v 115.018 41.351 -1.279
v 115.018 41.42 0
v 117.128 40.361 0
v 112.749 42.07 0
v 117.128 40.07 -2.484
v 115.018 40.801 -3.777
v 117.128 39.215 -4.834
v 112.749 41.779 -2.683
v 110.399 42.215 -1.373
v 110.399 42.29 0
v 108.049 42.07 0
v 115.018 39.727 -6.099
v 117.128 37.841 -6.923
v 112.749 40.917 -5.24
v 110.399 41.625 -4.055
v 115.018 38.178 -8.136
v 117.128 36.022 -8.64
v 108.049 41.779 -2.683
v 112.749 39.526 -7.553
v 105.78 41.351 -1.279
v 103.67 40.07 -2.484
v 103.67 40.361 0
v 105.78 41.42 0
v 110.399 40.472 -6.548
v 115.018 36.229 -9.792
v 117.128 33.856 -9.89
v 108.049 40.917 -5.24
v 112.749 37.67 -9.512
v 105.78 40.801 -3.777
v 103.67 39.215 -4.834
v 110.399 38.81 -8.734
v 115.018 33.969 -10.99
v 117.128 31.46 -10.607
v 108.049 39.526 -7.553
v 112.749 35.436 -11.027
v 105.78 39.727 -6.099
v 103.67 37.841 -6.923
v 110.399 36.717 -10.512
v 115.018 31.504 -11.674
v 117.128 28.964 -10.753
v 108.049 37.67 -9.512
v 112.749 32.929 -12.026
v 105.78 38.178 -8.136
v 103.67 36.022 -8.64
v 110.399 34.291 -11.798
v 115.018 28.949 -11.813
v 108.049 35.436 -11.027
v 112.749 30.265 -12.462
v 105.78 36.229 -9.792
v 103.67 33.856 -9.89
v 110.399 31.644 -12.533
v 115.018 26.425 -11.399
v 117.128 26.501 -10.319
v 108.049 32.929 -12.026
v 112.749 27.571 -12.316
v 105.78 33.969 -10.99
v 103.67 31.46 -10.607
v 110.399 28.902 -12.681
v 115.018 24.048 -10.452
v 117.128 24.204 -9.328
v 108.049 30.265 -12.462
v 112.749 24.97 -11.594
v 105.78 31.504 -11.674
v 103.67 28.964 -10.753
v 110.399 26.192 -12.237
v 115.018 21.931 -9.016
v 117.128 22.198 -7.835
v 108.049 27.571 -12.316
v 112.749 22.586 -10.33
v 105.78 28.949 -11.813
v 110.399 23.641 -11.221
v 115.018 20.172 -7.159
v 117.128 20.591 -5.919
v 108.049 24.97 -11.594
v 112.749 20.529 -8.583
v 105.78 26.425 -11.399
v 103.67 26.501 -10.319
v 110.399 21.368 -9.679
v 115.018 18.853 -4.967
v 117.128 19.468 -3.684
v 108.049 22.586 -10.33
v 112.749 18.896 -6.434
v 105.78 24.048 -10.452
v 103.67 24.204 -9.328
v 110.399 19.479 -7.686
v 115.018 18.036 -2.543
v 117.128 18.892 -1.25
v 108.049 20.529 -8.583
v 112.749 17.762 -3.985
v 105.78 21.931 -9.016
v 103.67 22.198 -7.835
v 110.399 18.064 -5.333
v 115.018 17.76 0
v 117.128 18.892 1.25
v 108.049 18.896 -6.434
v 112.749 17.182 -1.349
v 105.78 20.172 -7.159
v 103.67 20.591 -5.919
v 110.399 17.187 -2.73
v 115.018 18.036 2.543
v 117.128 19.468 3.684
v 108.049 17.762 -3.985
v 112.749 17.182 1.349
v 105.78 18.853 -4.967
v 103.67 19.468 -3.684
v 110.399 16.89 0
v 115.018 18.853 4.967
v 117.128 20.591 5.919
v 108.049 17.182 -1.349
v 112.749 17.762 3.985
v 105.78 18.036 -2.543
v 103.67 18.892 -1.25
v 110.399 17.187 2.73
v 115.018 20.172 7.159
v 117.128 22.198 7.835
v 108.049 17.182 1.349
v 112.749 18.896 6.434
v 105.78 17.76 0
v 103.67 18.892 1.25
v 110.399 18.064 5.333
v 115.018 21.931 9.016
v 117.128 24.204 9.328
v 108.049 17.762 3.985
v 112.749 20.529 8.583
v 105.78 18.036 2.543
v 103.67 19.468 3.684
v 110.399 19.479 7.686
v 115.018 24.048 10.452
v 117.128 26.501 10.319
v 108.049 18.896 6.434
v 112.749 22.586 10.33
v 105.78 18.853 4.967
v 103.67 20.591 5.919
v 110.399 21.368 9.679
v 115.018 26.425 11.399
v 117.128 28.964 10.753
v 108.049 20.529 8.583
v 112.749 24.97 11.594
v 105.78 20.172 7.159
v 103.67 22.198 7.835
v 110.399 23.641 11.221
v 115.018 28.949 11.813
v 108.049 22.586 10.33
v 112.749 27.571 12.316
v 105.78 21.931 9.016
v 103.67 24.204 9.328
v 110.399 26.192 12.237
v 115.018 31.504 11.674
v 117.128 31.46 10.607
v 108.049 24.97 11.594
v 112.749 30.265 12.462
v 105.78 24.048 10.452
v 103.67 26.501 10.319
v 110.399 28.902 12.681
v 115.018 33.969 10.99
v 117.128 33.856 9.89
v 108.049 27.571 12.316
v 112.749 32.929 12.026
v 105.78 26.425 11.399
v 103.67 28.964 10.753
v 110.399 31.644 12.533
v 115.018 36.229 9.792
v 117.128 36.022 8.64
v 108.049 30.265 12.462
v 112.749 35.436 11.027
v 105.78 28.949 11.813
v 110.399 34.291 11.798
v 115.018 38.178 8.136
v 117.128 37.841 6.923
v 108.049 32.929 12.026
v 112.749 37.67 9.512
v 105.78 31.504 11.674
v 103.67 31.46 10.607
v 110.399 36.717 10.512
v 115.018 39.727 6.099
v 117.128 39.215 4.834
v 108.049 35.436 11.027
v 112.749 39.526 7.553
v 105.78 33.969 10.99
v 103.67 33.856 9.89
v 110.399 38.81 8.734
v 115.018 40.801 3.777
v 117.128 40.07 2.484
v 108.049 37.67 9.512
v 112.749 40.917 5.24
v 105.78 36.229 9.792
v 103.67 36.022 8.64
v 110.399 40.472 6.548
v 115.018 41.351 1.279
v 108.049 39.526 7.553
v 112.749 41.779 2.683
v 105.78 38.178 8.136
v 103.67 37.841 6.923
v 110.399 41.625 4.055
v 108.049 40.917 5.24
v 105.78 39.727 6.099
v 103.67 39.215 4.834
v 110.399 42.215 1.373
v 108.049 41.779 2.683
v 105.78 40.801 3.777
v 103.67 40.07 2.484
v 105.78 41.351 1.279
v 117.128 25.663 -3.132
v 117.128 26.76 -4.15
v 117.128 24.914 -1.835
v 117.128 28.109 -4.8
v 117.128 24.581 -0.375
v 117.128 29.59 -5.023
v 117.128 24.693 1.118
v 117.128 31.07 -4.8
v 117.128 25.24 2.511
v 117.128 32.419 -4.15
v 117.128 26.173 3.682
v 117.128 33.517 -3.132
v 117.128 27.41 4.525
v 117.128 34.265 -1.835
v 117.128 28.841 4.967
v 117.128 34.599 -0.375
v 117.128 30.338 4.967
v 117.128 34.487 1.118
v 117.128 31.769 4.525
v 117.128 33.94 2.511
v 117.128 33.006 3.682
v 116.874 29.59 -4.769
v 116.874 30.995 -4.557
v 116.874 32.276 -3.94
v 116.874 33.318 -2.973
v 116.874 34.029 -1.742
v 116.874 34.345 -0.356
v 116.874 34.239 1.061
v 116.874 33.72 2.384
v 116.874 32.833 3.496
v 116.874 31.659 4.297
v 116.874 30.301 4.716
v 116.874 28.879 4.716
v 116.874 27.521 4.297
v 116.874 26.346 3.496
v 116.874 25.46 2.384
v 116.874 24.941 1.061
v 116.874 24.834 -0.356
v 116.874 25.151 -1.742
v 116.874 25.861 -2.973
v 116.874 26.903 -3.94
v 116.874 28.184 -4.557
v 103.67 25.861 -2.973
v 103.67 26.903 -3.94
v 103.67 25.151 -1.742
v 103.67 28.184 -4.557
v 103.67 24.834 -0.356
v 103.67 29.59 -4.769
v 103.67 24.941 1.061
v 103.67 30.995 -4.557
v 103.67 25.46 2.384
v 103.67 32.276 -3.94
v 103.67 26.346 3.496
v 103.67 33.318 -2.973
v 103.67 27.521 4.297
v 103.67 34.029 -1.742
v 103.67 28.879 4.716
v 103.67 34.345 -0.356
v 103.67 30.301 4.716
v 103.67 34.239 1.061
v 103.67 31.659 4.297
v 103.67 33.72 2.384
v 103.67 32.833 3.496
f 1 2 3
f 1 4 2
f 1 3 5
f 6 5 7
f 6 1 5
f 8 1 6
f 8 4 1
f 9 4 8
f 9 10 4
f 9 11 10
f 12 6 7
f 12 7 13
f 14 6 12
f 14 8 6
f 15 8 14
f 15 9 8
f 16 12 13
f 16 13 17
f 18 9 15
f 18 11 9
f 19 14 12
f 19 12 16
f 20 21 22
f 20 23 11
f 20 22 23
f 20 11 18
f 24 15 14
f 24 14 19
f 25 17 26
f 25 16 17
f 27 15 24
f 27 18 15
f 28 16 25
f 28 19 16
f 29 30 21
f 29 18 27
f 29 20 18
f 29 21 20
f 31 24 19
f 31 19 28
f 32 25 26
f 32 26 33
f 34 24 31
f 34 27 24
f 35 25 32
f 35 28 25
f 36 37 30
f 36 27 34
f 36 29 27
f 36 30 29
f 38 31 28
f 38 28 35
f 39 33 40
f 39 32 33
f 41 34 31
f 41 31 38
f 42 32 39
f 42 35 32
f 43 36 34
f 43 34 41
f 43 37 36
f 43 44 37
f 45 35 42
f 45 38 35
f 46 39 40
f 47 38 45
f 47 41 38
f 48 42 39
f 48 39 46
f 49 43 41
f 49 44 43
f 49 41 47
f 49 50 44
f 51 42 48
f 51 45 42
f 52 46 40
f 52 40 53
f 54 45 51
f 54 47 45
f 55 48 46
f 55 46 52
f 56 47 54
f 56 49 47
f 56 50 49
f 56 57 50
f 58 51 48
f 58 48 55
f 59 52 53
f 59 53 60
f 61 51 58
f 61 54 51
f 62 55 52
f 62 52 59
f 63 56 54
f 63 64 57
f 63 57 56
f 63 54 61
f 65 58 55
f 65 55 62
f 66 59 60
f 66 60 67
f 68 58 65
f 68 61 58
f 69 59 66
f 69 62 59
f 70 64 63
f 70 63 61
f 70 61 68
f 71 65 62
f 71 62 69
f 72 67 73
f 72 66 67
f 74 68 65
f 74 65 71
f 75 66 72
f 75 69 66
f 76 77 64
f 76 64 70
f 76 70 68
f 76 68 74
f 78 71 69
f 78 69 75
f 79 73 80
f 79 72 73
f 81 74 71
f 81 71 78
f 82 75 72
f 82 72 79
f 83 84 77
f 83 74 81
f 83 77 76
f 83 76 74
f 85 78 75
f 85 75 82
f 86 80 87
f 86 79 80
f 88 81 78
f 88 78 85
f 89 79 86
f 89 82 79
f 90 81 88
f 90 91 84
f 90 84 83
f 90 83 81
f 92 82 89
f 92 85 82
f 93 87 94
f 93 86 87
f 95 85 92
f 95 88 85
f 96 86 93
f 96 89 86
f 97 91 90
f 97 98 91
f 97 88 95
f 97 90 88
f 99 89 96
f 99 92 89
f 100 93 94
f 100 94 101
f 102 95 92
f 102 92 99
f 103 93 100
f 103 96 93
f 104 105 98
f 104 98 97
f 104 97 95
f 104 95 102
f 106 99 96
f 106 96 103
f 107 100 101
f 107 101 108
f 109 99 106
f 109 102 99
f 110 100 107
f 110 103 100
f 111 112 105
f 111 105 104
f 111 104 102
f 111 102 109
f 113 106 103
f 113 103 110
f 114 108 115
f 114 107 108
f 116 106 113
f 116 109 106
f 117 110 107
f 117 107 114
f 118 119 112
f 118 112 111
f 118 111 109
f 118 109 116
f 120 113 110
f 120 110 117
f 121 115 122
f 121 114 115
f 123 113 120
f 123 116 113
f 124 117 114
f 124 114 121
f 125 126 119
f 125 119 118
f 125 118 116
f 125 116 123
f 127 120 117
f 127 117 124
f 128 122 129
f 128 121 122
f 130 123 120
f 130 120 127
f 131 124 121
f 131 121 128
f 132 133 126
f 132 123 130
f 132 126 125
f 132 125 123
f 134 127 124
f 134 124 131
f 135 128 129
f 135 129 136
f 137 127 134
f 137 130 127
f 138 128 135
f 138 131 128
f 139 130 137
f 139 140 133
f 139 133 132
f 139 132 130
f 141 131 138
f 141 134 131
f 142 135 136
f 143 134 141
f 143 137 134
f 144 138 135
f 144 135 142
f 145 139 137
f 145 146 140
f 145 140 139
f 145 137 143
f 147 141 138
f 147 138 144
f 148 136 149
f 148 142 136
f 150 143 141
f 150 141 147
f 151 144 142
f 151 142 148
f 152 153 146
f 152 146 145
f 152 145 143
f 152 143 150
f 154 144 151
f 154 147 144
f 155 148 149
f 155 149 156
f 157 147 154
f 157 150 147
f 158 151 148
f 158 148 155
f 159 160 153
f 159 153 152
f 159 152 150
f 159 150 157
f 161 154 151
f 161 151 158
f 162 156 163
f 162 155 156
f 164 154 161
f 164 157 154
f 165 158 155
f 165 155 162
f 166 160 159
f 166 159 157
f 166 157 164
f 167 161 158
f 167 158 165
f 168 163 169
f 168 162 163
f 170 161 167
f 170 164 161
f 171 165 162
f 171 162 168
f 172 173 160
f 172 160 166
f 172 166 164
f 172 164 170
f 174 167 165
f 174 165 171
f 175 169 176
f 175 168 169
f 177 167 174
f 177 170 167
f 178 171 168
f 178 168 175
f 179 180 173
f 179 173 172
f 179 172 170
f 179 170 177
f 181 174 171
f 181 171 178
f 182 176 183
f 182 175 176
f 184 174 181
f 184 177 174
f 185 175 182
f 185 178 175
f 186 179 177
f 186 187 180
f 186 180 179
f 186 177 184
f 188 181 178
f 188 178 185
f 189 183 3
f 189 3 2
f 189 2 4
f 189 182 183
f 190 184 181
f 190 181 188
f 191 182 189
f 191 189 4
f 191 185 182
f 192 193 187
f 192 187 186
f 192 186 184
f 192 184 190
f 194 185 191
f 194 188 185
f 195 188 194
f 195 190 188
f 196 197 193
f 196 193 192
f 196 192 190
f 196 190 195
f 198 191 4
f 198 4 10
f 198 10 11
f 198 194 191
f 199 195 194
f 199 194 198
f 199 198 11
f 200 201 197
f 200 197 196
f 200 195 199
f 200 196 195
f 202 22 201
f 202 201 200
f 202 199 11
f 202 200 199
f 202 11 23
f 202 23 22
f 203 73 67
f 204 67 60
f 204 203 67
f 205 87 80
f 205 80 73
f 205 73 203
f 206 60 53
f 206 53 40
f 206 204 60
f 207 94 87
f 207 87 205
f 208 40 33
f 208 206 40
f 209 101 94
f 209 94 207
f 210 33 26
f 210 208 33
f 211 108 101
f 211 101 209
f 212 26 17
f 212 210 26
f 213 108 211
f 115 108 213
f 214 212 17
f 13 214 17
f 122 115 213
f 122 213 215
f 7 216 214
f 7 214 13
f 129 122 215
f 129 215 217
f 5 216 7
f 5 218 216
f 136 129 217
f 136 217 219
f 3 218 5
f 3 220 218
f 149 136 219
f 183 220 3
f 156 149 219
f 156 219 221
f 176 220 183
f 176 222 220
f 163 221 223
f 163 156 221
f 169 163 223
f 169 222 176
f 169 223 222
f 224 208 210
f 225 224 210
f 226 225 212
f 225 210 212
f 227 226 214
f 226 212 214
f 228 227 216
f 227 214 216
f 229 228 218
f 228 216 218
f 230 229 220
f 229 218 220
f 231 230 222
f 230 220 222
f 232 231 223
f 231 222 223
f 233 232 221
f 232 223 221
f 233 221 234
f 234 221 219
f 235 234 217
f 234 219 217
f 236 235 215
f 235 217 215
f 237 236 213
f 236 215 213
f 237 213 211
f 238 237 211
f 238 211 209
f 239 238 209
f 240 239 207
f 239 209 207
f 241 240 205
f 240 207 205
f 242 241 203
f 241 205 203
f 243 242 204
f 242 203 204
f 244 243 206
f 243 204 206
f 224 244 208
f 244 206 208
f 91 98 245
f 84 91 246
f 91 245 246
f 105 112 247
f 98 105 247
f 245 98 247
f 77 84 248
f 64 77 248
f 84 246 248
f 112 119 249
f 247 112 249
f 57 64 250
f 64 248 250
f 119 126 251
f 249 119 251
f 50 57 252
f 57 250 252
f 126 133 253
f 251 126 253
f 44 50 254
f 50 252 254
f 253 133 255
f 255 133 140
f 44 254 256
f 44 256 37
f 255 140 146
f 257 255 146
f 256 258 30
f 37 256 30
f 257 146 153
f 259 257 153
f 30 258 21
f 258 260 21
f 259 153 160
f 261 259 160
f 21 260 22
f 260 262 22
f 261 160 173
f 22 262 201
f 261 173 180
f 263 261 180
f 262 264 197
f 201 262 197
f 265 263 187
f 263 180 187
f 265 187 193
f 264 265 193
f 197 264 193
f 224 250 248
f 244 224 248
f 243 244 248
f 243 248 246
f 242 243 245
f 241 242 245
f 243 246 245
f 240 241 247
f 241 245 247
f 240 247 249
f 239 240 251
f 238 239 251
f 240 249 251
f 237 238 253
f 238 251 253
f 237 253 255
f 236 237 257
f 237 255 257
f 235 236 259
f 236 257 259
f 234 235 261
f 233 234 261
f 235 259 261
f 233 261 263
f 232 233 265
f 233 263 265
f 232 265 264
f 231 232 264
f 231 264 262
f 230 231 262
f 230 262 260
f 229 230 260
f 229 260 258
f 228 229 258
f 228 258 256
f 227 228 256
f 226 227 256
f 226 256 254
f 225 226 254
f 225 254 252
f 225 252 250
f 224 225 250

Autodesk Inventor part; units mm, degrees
ref_plane "YZ Plane" through (0, 0, 0) normal (1, 0, 0) x (0, 1, 0)
ref_plane "XZ Plane" through (0, 0, 0) normal (0, 1, 0) x (-1, 0, 0)
ref_plane "XY Plane" through (0, 0, 0) normal (0, 0, 1) x (1, 0, 0)
sketch "Sketch1" plane through (0, 0, 0) normal (0, 0, 1) x (1, 0, 0)
  arc A0 (103.6702, 18.7694) -> (117.1276, 18.7694) centre (110.3989, 29.5404) ccw
  line L0 (103.6702, 40.3608) -> (103.6702, 29.5898)
  line L1 (117.1276, 40.3608) -> (117.1276, 29.5898)
  line L2 (95.2163, 29.5898) -> (125.5815, 29.5898)
  arc A1 (117.1276, 40.3608) -> (103.6702, 40.3608) centre (110.3989, 29.5898) ccw
  point P0 (0, 0)
  point P1 (110.3989, 16.8404)
  dimension "d44" = 21.6408
  dimension "d45" = 12.7
  dimension "d46" = 12.7
revolve "Revolution1" add sketch "Sketch1" angle 360 about axis through (95.2163, 29.5898, 0) along (1, 0, 0)
sketch "Sketch2" plane through (117.1276, 29.5898, 0) normal (1, 0, 0) x (0, 0, -1)
  circle A0 centre (0, 0) radius 10.771 projected
  point P0 (0, -29.5898)
hole "Hole1" at (117.1276, 29.5898, 0) direction (-1, 0, 0) diameter 9.5377 depth 25.4 tip angle 118
chamfer "Chamfer1" distance 0.254 angle 45 1 edges at (117.1276, 29.5898, 4.7689)
equation "\"d45\" = d46"
properties part number "FM1406P"
